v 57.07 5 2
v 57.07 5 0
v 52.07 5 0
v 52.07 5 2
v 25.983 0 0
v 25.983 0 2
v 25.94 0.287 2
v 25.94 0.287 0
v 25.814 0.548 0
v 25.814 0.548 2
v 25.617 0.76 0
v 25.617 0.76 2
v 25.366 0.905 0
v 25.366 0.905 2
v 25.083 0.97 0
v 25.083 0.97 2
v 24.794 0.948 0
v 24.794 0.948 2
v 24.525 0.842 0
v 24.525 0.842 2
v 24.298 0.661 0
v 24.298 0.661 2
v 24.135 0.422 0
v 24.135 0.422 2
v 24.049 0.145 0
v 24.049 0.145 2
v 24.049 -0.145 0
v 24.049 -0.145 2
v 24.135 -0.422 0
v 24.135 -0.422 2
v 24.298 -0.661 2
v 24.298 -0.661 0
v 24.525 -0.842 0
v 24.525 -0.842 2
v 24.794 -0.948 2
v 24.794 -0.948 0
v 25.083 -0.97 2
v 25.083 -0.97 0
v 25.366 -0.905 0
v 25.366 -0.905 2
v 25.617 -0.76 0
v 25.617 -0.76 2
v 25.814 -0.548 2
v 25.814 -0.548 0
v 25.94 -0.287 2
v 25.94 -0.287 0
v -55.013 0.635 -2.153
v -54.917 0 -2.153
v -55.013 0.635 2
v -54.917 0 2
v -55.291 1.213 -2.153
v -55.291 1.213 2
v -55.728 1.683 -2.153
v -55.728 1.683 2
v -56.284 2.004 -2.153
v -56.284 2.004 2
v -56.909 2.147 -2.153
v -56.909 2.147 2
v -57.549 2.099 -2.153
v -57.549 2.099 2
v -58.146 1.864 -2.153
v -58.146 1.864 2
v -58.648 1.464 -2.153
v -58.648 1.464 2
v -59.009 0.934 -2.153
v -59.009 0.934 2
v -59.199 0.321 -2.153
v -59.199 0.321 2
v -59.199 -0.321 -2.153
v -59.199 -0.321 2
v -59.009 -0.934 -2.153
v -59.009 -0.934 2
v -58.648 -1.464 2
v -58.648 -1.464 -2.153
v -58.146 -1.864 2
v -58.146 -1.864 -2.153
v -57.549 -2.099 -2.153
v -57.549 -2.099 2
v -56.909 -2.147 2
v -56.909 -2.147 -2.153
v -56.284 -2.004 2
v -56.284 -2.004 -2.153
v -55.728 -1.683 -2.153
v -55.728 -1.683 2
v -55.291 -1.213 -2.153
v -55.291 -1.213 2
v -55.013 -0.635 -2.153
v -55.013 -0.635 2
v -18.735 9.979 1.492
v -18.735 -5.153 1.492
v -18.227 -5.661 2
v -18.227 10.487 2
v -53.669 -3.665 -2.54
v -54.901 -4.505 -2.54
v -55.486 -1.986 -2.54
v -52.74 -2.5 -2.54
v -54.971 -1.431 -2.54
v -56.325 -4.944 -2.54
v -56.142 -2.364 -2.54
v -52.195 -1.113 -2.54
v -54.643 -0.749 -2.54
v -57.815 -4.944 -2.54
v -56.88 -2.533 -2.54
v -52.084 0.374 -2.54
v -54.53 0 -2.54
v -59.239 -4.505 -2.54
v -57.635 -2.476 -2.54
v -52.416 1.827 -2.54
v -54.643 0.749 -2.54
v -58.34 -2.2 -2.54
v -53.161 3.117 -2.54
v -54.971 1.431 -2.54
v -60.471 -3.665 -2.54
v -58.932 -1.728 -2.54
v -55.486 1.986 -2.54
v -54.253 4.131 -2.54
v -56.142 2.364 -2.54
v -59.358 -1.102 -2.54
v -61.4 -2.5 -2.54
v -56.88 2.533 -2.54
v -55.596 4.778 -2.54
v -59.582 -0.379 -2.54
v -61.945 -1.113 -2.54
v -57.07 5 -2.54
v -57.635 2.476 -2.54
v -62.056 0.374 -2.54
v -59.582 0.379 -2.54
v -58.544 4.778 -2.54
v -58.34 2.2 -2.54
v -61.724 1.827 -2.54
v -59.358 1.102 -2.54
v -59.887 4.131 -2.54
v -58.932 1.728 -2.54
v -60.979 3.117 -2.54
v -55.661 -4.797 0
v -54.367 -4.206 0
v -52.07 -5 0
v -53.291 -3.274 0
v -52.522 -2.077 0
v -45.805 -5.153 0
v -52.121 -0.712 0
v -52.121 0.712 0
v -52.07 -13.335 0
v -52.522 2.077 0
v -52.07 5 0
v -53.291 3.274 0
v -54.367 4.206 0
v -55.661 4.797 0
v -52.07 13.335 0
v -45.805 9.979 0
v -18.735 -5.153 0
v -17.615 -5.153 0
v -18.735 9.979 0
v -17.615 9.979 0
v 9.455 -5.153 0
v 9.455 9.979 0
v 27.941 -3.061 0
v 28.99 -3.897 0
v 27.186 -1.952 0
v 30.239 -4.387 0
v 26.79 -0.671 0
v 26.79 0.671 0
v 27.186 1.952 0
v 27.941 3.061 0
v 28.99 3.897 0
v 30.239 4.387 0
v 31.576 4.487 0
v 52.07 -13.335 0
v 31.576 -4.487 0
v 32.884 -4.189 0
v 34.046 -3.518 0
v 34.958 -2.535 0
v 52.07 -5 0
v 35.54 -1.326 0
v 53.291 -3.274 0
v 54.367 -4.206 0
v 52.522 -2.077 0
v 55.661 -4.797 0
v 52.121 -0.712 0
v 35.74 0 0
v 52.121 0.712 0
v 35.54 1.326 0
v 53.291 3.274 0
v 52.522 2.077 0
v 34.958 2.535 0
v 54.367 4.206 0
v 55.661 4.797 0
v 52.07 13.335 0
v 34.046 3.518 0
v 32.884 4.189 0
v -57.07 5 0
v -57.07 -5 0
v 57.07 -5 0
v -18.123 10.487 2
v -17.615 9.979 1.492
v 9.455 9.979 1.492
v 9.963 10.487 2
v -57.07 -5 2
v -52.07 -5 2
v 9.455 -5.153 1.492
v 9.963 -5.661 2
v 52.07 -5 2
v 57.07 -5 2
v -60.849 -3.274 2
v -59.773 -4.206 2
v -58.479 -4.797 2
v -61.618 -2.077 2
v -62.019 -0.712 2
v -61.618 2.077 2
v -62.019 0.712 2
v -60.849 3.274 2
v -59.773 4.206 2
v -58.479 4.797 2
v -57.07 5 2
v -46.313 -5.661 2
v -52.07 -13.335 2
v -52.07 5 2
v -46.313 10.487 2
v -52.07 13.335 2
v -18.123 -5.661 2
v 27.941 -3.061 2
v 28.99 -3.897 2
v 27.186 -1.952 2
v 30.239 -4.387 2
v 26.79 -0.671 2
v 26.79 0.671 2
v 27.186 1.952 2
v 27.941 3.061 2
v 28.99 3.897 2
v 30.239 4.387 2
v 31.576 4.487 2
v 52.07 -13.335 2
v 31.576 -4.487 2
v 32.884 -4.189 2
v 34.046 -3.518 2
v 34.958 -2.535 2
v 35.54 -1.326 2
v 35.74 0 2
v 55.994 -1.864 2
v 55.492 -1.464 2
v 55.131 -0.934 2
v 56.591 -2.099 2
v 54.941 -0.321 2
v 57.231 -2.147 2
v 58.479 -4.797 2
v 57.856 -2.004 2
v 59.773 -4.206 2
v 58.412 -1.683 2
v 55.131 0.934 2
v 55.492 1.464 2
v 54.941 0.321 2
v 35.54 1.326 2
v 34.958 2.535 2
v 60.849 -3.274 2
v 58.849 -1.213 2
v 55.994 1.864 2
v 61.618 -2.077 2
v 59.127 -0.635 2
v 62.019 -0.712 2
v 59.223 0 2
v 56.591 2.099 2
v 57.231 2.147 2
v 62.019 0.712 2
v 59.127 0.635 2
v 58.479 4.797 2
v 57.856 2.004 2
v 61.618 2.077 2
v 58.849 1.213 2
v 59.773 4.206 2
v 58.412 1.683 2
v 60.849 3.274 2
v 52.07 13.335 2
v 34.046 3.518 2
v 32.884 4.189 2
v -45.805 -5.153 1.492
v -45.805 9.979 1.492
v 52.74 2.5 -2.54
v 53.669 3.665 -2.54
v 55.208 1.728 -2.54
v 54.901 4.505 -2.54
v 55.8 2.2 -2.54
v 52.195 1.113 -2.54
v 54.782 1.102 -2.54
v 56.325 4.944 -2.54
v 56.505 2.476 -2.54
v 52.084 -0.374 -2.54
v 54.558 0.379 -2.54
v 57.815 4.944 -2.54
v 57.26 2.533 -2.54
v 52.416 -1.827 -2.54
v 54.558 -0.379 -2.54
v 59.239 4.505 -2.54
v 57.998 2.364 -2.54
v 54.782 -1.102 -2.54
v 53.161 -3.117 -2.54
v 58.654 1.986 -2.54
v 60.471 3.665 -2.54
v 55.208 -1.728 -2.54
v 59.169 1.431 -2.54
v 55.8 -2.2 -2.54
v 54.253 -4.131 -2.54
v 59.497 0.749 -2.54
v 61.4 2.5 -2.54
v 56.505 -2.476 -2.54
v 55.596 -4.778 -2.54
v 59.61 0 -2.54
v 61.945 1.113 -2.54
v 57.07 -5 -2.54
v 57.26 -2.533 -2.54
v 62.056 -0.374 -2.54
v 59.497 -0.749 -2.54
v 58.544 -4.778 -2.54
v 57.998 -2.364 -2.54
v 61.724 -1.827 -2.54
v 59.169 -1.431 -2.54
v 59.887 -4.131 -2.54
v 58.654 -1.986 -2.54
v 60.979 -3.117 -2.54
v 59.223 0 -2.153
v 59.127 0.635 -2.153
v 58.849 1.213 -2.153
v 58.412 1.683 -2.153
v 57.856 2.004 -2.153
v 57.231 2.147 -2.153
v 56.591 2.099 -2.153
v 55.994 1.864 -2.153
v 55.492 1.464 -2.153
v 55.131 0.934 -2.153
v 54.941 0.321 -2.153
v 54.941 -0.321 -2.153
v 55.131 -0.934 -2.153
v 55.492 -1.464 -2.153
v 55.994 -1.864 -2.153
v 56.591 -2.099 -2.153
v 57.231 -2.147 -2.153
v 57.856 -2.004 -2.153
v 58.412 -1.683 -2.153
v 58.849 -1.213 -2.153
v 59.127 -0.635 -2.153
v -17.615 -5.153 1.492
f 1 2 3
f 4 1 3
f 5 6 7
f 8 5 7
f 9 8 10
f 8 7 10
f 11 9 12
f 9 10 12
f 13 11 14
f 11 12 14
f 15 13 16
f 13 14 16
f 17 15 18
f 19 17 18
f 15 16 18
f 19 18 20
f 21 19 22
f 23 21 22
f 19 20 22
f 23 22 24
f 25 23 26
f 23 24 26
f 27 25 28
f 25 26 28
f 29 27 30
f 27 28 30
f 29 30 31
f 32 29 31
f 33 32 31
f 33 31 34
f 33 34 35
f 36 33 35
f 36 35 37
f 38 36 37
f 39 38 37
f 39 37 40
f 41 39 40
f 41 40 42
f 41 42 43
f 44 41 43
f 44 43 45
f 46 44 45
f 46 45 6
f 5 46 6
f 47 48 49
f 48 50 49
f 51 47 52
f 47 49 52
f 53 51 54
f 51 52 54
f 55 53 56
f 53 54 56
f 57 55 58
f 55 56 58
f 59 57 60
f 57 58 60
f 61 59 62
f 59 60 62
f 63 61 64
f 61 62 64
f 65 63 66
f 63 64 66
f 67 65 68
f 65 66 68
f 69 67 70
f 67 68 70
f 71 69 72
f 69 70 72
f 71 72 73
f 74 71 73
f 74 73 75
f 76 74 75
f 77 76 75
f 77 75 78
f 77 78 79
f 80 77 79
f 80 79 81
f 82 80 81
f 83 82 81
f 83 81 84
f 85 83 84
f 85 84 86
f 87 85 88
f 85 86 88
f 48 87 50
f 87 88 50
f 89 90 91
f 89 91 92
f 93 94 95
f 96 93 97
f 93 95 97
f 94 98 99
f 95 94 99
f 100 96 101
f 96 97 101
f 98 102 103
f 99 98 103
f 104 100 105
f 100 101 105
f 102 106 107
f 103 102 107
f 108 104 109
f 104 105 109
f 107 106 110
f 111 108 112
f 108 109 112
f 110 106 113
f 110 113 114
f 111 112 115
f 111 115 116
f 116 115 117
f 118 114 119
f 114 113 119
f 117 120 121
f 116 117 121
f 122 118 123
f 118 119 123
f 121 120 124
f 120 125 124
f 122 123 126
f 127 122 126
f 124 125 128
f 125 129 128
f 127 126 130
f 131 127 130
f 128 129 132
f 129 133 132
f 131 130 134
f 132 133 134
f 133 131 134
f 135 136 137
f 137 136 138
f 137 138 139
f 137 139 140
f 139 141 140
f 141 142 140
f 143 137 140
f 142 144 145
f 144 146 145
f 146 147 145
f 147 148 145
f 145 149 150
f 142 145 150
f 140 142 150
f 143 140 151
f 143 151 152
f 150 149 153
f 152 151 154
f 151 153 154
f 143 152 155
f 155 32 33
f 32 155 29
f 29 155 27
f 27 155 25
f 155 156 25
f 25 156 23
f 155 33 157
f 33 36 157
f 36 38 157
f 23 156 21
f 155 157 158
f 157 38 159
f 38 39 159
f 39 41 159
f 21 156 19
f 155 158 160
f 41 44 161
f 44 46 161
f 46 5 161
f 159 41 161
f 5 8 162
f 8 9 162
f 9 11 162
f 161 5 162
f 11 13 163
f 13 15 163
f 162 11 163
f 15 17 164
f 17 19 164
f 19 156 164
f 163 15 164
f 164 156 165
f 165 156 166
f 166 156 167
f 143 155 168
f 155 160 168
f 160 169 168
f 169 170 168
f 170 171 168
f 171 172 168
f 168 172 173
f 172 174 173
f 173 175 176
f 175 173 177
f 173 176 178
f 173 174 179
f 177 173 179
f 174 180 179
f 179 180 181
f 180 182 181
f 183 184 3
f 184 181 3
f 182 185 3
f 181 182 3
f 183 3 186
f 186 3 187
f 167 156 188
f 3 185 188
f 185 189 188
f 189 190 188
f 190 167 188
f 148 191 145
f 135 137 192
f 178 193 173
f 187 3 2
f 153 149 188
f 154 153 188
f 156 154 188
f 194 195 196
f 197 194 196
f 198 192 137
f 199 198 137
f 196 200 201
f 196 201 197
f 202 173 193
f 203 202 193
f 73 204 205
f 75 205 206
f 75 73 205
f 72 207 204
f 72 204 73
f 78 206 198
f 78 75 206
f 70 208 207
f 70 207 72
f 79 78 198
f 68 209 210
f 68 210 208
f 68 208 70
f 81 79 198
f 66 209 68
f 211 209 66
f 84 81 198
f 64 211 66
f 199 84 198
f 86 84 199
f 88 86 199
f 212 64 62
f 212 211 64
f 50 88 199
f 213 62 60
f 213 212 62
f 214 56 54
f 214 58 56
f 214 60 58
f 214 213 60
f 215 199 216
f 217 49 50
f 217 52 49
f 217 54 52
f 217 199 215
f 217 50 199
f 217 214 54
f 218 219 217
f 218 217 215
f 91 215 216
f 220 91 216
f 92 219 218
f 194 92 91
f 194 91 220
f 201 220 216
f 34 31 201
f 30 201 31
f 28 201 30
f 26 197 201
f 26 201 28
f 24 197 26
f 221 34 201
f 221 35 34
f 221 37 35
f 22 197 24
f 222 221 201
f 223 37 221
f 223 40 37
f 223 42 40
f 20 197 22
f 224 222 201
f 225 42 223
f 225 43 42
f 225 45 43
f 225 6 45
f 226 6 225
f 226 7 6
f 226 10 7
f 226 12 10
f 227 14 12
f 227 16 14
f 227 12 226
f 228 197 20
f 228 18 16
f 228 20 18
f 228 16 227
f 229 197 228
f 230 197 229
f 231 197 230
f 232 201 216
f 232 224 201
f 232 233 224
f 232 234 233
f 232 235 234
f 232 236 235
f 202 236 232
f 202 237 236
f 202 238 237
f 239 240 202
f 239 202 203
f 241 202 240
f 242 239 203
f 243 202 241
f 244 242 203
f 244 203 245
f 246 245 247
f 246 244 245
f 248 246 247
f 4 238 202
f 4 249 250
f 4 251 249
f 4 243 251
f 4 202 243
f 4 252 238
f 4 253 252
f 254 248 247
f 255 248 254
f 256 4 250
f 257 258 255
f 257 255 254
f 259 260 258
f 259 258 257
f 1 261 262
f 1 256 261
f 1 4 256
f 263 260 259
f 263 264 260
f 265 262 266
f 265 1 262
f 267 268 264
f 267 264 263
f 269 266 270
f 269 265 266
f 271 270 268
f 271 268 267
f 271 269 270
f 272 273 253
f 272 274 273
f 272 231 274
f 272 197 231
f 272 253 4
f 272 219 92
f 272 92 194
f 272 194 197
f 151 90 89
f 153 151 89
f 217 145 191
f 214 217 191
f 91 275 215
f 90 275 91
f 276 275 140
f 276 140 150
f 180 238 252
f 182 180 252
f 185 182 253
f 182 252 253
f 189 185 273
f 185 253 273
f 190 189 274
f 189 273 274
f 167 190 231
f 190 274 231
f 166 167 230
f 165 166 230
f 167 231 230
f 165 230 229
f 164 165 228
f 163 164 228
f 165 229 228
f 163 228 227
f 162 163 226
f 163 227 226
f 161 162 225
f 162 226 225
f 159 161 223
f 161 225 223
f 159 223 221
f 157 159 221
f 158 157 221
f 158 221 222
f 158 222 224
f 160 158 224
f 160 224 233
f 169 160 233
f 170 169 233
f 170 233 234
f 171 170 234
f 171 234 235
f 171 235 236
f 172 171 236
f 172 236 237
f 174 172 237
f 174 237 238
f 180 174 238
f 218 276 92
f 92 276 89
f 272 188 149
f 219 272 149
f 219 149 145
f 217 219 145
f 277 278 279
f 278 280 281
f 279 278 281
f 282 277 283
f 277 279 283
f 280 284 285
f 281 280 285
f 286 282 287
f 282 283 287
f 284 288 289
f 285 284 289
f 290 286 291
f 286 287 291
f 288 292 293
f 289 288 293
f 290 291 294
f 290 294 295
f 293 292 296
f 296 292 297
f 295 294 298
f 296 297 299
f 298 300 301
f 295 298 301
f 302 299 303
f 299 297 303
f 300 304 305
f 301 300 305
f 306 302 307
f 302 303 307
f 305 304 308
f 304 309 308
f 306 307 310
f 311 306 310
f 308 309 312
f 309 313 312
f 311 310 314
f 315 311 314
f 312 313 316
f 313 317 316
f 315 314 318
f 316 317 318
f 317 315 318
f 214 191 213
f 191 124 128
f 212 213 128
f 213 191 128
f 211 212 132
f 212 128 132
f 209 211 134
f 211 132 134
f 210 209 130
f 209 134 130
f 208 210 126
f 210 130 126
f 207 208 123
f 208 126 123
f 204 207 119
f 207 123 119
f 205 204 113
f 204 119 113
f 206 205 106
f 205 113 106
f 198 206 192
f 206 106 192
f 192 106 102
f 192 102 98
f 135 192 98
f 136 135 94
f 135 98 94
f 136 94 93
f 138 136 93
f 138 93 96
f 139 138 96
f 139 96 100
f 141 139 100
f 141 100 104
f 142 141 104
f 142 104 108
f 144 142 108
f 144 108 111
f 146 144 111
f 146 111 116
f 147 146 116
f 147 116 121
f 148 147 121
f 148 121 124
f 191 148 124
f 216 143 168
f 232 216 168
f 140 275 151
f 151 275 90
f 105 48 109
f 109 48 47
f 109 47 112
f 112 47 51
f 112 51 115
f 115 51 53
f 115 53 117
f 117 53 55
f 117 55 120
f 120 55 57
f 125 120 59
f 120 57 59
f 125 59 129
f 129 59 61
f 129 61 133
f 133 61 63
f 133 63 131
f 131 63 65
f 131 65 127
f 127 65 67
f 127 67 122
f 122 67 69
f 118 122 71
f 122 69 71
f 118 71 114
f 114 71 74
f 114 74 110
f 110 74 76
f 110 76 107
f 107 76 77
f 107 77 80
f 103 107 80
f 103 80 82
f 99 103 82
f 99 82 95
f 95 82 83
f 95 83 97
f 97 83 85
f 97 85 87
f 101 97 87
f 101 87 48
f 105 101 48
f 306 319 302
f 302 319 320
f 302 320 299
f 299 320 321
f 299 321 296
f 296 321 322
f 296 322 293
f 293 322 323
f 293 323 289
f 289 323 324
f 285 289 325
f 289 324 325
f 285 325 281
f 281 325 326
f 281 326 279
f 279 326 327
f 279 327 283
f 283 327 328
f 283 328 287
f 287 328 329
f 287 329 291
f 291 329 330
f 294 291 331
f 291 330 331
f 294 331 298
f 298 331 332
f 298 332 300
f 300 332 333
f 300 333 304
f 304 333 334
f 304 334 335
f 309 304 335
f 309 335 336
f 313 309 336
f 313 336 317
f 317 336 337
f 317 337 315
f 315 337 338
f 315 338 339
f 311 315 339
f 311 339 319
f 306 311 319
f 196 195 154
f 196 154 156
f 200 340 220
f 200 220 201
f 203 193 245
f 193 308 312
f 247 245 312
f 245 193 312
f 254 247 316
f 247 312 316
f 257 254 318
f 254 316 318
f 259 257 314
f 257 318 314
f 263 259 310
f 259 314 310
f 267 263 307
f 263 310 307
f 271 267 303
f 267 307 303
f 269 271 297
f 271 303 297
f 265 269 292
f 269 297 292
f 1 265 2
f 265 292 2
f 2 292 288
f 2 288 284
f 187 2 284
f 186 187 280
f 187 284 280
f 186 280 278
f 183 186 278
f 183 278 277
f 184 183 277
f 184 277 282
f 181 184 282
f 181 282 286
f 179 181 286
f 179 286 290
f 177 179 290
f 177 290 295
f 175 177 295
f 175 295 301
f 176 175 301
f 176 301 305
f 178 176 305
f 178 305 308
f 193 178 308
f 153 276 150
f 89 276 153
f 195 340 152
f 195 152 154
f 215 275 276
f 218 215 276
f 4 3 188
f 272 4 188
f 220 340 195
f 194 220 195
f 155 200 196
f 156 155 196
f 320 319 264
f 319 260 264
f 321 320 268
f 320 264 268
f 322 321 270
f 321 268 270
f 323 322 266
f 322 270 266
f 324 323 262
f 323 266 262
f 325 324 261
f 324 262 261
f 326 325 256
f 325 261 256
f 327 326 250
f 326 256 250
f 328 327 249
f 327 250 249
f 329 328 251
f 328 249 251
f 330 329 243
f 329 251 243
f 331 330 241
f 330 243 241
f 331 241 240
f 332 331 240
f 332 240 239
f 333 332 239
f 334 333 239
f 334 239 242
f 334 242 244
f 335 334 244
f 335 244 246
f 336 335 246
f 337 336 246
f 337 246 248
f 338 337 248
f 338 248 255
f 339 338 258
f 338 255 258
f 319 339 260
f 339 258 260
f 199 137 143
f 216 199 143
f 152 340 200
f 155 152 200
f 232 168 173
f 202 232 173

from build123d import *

# Parameters (mm, degrees)
BOSS_EXTRUDE1_DEPTH                    = 2
BOSS_EXTRUDE2_START                    = -2.54
SKETCH5_R                              = 5.00000016
BOSS_EXTRUDE2_DEPTH                    = 2.54
F_18_0_1695_DIAMETER_HOLE1_D           = 4.3053
F_18_0_1695_DIAMETER_HOLE1_DEPTH       = 4.572
F_18_0_1695_DIAMETER_HOLE1_CSINK_D     = 5.08
F_18_0_1695_DIAMETER_HOLE1_CSINK_ANGLE = 90
F_18_0_1695_DIAMETER_HOLE1_TIP         = 1.293442612
SKETCH3_R                              = 4.5
SKETCH3_R_2                            = 0.97241532
SKETCH3_W                              = 27.07
SKETCH3_H                              = 15.132
CUT_EXTRUDE1_DEPTH                     = 64.648399546
CHAMFER1_SIZE                          = 0.508


with BuildPart() as part:
    # Sketch1 → Boss-Extrude1 (new body)
    with BuildSketch(Plane.XY):
        with BuildLine():
            Line((-52.07, 5.00000016), (-57.07000016, 5.00000016))
            ThreePointArc((-57.07000016, 5.00000016), (-62.07000032, 0), (-57.07000016, -5.00000016))
            Line((-57.07000016, -5.00000016), (-52.07, -5.00000016))
            Line((-52.07, -5.00000016), (-52.07, -13.335))
            Line((-52.07, -13.335), (52.07, -13.335))
            Line((52.07, -13.335), (52.07, -5.00000016))
            Line((52.07, -5.00000016), (57.07000016, -5.00000016))
            ThreePointArc((57.07000016, -5.00000016), (62.07000032, 0), (57.07000016, 5.00000016))
            Line((57.07000016, 5.00000016), (52.07, 5.00000016))
            Line((52.07, 5.00000016), (52.07, 13.335))
            Line((52.07, 13.335), (-52.07, 13.335))
            Line((-52.07, 13.335), (-52.07, 5.00000016))
        make_face()
    extrude(amount=BOSS_EXTRUDE1_DEPTH)

    # Sketch5 → Boss-Extrude2 (add)
    with BuildSketch(Plane.XY.offset(BOSS_EXTRUDE2_START)):
        with Locations(Location((-57.07000016, 0, 0), (0, 0, 90))):
            Circle(SKETCH5_R)
        with Locations(Location((57.07000016, 0, 0), (0, 0, 270))):
            Circle(SKETCH5_R)
    extrude(amount=BOSS_EXTRUDE2_DEPTH)

    # #18 (0.1695) Diameter Hole1
    with Locations(Plane(origin=(0, 0, -2.54), x_dir=(-1, 0, 0), z_dir=(0, 0, -1))):
        with Locations((57.07000016, 0), (-57.07000016, 0)):
            CounterSinkHole(F_18_0_1695_DIAMETER_HOLE1_D / 2, F_18_0_1695_DIAMETER_HOLE1_CSINK_D / 2, depth=F_18_0_1695_DIAMETER_HOLE1_DEPTH, counter_sink_angle=F_18_0_1695_DIAMETER_HOLE1_CSINK_ANGLE)
            with Locations((0, 0, -(F_18_0_1695_DIAMETER_HOLE1_DEPTH + F_18_0_1695_DIAMETER_HOLE1_TIP / 2))):  # 118° drill point
                Cone(0, F_18_0_1695_DIAMETER_HOLE1_D / 2, F_18_0_1695_DIAMETER_HOLE1_TIP, mode=Mode.SUBTRACT)

    # Sketch3 → Cut-Extrude1 (cut, through all)
    with BuildSketch(Plane.XY.offset(2)):
        with Locations((31.240005277, 0)):
            Circle(SKETCH3_R)
        with Locations((25.010807092, 0)):
            Circle(SKETCH3_R_2)
        with Locations((-4.079994723, 2.413)):
            Rectangle(SKETCH3_W, SKETCH3_H)
        with Locations((-32.269994731, 2.413)):
            Rectangle(SKETCH3_W, SKETCH3_H)
    extrude(amount=-CUT_EXTRUDE1_DEPTH, mode=Mode.SUBTRACT)

    # Chamfer1
    chamfer1_edges = [part.edges().sort_by_distance(p)[0] for p in [
        (-18.734994731, 2.413, 2),
        (-32.269994731, 9.979, 2),
        (-45.804994731, 2.413, 2),
        (-32.269994731, -5.153, 2),
        (-17.614994723, 2.413, 2),
        (-4.079994723, -5.153, 2),
        (9.455005277, 2.413, 2),
        (-4.079994723, 9.979, 2),
    ]]
    chamfer(chamfer1_edges, length=CHAMFER1_SIZE)


solid = part.part
